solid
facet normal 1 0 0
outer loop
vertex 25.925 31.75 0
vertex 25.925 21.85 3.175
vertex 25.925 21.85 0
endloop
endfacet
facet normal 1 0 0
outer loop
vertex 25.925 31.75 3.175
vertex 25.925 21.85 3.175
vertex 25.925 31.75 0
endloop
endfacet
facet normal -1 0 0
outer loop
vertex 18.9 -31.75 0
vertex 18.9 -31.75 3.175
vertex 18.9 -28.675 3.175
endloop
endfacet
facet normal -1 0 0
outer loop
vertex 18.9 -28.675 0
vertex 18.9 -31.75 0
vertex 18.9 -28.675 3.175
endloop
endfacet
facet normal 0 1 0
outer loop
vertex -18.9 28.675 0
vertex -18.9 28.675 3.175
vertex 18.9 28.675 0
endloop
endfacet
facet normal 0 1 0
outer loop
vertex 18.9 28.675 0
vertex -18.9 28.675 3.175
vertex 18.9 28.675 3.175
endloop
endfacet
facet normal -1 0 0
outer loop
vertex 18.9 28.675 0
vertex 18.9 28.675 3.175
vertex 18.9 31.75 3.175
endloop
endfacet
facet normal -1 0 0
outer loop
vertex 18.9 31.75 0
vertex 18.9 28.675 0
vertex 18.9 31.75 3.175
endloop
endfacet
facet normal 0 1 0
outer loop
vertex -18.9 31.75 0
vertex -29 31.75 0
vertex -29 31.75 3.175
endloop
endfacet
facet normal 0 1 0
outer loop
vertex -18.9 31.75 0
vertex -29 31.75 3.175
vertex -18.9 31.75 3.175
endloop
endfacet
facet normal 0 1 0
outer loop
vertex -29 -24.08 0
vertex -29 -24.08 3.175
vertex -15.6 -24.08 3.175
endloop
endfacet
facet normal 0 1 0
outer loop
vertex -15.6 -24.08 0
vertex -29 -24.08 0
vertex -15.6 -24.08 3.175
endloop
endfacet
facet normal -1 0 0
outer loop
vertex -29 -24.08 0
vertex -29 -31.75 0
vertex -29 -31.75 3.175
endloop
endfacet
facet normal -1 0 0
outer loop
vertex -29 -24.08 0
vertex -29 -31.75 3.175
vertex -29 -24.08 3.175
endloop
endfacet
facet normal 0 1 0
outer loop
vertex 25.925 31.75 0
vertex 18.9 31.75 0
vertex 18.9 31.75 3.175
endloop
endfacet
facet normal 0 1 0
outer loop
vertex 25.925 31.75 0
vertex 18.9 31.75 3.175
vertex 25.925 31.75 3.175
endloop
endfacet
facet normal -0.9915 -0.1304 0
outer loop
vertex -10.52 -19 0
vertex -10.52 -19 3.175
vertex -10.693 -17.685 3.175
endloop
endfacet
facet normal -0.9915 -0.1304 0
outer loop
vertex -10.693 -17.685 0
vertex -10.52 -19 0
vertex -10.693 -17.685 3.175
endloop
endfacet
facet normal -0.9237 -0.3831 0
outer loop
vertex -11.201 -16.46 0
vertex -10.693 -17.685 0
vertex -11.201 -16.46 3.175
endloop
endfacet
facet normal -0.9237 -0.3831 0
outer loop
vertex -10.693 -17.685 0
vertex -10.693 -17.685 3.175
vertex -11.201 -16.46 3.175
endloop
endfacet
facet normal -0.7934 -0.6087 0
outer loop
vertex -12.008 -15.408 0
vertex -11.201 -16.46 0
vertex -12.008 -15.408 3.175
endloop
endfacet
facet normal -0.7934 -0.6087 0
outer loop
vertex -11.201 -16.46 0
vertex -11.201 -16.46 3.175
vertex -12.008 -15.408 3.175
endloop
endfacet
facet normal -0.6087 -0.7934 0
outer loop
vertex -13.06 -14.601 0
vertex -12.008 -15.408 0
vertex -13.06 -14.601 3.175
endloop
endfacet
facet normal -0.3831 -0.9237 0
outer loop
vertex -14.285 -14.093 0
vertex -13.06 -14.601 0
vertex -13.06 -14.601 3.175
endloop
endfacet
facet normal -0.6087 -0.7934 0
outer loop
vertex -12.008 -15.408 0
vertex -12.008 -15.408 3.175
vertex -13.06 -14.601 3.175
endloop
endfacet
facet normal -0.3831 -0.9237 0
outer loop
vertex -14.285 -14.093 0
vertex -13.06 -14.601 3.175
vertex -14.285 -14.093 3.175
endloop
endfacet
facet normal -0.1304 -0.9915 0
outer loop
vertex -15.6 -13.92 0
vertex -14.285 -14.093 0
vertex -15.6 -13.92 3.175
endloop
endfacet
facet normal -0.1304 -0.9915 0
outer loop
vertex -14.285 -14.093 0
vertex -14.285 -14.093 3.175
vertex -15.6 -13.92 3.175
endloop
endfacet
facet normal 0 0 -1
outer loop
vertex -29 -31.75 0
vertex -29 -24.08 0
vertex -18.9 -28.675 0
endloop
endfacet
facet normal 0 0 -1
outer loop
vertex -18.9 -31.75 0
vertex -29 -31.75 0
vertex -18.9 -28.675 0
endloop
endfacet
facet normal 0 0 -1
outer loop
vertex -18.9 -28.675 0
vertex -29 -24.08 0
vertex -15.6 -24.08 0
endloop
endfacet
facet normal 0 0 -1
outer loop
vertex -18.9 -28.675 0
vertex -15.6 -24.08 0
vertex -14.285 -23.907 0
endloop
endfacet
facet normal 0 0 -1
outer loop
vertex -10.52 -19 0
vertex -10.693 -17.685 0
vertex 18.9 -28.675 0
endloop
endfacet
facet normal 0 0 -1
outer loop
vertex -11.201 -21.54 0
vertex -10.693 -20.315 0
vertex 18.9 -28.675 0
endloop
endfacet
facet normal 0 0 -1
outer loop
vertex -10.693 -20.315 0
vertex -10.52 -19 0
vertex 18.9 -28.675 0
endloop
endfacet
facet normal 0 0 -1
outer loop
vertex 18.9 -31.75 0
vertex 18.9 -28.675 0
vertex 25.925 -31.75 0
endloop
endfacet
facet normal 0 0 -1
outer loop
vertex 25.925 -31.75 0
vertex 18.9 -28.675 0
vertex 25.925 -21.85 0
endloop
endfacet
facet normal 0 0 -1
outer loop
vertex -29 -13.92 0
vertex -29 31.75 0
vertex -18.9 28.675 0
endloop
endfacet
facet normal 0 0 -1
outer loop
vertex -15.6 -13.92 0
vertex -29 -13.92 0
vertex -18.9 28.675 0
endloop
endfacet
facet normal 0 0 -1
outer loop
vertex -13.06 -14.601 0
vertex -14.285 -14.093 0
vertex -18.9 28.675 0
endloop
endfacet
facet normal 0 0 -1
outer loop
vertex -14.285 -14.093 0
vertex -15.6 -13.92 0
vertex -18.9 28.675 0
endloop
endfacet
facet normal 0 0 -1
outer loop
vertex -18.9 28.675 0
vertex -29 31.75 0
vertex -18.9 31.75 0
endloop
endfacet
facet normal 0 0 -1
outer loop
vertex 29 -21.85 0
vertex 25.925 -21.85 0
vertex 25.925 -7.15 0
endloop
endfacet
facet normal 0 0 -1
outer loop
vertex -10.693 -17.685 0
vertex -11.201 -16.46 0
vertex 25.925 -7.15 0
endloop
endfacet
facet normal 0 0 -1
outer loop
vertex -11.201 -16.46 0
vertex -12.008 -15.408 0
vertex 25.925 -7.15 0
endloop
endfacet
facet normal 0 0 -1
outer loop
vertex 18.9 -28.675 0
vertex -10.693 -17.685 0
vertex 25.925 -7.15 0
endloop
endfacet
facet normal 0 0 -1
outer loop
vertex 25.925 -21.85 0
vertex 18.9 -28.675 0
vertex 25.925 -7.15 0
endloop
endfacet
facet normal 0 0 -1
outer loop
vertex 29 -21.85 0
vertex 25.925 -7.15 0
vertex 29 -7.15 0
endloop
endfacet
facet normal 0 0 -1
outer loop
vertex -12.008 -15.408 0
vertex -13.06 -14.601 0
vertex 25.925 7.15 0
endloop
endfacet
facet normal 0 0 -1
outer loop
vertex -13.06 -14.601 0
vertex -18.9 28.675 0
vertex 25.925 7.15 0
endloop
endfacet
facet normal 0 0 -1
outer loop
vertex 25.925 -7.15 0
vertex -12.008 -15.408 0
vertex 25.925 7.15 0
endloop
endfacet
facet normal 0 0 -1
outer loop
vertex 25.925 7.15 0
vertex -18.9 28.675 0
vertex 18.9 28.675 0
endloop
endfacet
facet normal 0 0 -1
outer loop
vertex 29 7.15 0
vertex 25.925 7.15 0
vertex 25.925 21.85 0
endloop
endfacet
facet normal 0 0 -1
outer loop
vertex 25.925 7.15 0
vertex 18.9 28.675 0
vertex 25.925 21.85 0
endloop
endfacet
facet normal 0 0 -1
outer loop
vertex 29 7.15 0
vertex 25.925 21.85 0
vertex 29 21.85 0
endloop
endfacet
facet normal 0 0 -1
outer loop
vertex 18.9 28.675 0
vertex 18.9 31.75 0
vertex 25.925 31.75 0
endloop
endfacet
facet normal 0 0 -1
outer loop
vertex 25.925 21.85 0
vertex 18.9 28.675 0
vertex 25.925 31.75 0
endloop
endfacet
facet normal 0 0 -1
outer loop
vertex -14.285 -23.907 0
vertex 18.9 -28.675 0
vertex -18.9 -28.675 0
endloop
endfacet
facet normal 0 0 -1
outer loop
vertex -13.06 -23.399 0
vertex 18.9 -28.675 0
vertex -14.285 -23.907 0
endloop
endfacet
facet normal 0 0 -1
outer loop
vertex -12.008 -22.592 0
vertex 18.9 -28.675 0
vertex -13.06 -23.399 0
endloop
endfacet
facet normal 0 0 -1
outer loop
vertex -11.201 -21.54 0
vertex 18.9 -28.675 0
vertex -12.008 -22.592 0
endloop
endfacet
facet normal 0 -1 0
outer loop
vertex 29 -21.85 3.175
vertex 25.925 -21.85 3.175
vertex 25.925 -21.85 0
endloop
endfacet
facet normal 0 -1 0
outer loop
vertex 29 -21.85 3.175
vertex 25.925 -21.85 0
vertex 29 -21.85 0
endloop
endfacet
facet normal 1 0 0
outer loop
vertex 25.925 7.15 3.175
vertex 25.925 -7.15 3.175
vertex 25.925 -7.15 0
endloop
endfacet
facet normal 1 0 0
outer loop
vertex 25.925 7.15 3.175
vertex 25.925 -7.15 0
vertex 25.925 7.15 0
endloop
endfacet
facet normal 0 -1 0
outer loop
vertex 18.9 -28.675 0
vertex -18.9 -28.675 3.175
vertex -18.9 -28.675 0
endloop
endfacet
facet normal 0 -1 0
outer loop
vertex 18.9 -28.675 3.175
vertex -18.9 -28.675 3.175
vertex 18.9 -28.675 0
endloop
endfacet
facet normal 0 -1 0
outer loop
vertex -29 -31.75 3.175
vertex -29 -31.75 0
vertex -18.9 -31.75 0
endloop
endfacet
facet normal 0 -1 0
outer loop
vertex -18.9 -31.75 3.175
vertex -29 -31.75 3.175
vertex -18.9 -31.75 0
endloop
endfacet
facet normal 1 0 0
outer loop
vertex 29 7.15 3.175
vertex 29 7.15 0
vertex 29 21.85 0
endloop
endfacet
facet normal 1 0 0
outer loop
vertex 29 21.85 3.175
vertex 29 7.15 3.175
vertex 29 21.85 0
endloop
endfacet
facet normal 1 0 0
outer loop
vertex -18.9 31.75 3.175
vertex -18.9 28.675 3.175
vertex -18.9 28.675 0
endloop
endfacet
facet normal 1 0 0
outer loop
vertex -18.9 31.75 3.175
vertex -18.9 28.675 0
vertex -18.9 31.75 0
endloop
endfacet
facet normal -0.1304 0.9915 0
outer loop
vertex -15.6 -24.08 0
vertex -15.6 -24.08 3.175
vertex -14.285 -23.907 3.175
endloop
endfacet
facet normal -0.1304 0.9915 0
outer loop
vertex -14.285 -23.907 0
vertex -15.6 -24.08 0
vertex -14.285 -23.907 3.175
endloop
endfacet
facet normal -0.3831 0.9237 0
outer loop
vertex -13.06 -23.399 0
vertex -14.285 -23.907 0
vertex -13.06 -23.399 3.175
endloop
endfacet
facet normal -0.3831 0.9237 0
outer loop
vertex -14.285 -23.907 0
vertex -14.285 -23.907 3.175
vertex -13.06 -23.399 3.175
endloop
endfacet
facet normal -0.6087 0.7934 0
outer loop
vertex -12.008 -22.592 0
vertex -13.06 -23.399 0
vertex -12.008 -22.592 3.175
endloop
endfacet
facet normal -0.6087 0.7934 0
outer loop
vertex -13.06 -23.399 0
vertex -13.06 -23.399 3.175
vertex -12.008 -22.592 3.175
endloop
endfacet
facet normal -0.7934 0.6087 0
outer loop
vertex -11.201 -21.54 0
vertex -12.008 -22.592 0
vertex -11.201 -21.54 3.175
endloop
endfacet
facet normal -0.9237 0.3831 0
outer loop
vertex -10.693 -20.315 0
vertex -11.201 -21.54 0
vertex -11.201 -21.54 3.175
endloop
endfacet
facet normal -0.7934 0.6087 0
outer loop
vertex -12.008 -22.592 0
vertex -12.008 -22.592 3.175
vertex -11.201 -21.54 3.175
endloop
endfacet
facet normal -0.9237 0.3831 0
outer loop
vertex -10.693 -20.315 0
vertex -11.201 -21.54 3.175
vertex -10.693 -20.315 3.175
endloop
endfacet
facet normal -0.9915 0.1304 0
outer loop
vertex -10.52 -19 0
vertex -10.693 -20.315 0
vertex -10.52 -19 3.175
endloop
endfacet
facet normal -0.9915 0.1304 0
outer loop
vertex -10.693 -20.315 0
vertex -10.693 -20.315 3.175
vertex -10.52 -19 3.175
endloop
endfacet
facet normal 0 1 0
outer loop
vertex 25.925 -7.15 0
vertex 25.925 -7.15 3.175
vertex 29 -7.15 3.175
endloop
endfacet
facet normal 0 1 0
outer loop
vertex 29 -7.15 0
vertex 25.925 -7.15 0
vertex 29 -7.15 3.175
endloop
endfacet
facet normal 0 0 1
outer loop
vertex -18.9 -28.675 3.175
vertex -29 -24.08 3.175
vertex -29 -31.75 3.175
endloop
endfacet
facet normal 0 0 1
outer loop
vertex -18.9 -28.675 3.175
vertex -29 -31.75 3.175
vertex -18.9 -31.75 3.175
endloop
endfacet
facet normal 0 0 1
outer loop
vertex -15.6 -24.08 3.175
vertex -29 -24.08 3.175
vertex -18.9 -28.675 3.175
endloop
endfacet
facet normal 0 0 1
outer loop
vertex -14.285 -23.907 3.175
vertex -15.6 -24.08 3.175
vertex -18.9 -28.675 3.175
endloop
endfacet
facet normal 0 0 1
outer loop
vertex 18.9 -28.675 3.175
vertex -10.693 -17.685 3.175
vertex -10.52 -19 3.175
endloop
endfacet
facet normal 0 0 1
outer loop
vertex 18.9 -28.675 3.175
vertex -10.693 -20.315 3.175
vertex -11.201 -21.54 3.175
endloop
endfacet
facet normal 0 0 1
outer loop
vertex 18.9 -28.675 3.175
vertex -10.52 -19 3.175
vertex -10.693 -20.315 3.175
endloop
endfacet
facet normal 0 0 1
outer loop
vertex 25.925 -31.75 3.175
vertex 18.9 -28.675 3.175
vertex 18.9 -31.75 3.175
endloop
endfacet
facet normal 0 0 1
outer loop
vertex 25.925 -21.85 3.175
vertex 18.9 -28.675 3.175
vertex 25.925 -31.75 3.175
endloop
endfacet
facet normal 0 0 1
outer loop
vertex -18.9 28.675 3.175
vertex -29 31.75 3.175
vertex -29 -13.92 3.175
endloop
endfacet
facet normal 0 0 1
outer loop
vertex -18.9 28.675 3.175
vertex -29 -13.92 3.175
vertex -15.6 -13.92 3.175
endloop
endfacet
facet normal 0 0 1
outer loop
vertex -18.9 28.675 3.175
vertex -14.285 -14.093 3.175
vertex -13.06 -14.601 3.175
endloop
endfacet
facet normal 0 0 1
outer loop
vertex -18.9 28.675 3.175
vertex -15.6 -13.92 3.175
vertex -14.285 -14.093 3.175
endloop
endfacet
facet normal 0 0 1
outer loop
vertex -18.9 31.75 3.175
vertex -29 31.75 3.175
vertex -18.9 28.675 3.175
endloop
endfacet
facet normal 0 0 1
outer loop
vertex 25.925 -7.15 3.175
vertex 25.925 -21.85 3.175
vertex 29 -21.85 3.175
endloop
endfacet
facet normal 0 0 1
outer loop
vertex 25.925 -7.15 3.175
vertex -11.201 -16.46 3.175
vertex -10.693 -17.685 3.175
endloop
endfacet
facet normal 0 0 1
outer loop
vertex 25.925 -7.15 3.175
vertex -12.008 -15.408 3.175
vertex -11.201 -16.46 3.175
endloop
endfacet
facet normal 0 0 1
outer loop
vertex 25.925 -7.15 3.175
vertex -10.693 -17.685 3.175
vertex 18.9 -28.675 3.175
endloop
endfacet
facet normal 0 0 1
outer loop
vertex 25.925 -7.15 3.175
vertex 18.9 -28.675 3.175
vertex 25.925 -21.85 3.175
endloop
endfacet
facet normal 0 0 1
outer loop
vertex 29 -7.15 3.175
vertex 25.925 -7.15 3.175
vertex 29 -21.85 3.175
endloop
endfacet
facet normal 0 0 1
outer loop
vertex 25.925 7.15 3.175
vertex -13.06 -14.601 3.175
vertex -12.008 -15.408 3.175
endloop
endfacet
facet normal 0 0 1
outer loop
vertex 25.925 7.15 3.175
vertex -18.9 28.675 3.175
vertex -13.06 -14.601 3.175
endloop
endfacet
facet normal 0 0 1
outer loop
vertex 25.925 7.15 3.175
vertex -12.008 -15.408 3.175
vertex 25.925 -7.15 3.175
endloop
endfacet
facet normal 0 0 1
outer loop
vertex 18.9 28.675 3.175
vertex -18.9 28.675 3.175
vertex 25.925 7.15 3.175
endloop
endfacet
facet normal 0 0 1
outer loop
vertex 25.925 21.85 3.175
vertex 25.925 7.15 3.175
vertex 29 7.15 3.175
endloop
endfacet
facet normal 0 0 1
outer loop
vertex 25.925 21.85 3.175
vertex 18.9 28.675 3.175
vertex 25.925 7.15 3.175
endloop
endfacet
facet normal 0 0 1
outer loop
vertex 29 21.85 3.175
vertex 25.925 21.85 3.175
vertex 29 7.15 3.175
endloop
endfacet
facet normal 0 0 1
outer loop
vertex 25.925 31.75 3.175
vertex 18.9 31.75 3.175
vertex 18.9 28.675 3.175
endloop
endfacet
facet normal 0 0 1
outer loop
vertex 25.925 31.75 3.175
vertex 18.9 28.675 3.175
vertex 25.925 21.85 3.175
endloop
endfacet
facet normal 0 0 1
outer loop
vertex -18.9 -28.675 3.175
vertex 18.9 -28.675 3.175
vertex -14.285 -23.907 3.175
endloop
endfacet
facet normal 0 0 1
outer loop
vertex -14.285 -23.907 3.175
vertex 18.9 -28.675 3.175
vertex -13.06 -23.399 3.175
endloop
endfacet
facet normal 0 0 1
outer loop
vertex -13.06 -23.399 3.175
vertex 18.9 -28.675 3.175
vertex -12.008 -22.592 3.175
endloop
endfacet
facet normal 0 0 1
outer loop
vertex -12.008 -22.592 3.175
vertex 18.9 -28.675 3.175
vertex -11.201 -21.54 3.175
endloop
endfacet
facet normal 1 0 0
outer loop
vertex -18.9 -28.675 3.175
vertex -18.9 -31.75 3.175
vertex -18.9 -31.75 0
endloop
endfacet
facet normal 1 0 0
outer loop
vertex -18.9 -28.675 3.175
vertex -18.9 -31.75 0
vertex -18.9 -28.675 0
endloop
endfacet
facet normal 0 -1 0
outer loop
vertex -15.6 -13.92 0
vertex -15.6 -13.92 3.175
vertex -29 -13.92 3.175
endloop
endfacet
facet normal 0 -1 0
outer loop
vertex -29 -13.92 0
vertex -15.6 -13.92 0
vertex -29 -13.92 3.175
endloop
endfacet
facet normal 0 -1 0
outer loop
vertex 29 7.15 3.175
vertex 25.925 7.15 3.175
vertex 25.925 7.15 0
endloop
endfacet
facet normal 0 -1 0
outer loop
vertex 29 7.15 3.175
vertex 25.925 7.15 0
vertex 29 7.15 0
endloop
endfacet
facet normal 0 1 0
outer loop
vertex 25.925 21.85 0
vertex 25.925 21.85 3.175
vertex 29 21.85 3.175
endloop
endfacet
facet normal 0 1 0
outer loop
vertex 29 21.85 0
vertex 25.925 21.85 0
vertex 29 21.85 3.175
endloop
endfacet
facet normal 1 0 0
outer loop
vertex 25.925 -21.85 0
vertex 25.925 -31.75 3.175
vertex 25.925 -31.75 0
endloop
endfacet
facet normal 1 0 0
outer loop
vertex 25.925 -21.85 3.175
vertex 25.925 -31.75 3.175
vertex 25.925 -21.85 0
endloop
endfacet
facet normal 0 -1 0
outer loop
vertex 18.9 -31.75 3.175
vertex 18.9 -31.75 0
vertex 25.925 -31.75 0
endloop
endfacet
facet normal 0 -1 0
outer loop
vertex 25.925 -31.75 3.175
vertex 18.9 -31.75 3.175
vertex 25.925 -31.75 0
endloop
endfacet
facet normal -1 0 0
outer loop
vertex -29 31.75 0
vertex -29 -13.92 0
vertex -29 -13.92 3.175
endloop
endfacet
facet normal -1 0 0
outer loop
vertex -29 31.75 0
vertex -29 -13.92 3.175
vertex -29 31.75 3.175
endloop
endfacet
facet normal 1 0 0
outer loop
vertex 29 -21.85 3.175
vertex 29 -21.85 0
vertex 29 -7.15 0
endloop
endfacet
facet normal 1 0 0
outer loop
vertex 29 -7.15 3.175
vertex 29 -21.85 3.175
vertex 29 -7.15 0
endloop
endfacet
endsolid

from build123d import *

# Parameters (mm, degrees)
F0_W     = 58
F0_H     = 63.5
F1_DEPTH = 3.175
F2_W     = 37.8
F2_H     = 3.075
F2_W_2   = 3.075
F2_H_2   = 14.3
F2_H_3   = 9.9
F3_DEPTH = 25
F5_DEPTH = 25


# Not quite as in the source:
# - a length typed as a fraction of an inch, garbled in the dataset ("3 / 203.2 mm" for 3/8 in), is restored


with BuildPart() as f1:
    # F0 (on Top) → F1 (new body)
    with BuildSketch(Plane.XY):
        Rectangle(F0_W, F0_H)
    extrude(amount=F1_DEPTH)

    # F2 (on face) → F3 (cut)
    with BuildSketch(Plane.XY.offset(3.175)):
        with Locations((0, -30.2125)):
            Rectangle(F2_W, F2_H)
        with Locations((0, 30.2125)):
            Rectangle(F2_W, F2_H)
        with Locations((27.4625, 0)):
            Rectangle(F2_W_2, F2_H_2)
        with Locations((27.4625, -26.8)):
            Rectangle(F2_W_2, F2_H_3)
        with Locations((27.4625, 26.8)):
            Rectangle(F2_W_2, F2_H_3)
    extrude(amount=-F3_DEPTH, mode=Mode.SUBTRACT)

    # F4 (on face) → F5 (cut)
    with BuildSketch(Plane.XY.offset(3.175)):
        with BuildLine():
            ThreePointArc((-15.6, -24.08), (-20.68, -19), (-15.6, -13.92))
            Line((-15.6, -13.92), (-29, -13.92))
            Line((-29, -13.92), (-29, -24.08))
            Line((-29, -24.08), (-15.6, -24.08))
        make_face()
        with BuildLine():
            ThreePointArc((-15.6, -24.08), (-12.0078975516, -22.5921024484), (-10.52, -19))
            ThreePointArc((-10.52, -19), (-12.0078975516, -15.4078975516), (-15.6, -13.92))
            ThreePointArc((-15.6, -13.92), (-20.68, -19), (-15.6, -24.08))
        make_face()
    extrude(amount=-F5_DEPTH, mode=Mode.SUBTRACT)


solid = f1.part
